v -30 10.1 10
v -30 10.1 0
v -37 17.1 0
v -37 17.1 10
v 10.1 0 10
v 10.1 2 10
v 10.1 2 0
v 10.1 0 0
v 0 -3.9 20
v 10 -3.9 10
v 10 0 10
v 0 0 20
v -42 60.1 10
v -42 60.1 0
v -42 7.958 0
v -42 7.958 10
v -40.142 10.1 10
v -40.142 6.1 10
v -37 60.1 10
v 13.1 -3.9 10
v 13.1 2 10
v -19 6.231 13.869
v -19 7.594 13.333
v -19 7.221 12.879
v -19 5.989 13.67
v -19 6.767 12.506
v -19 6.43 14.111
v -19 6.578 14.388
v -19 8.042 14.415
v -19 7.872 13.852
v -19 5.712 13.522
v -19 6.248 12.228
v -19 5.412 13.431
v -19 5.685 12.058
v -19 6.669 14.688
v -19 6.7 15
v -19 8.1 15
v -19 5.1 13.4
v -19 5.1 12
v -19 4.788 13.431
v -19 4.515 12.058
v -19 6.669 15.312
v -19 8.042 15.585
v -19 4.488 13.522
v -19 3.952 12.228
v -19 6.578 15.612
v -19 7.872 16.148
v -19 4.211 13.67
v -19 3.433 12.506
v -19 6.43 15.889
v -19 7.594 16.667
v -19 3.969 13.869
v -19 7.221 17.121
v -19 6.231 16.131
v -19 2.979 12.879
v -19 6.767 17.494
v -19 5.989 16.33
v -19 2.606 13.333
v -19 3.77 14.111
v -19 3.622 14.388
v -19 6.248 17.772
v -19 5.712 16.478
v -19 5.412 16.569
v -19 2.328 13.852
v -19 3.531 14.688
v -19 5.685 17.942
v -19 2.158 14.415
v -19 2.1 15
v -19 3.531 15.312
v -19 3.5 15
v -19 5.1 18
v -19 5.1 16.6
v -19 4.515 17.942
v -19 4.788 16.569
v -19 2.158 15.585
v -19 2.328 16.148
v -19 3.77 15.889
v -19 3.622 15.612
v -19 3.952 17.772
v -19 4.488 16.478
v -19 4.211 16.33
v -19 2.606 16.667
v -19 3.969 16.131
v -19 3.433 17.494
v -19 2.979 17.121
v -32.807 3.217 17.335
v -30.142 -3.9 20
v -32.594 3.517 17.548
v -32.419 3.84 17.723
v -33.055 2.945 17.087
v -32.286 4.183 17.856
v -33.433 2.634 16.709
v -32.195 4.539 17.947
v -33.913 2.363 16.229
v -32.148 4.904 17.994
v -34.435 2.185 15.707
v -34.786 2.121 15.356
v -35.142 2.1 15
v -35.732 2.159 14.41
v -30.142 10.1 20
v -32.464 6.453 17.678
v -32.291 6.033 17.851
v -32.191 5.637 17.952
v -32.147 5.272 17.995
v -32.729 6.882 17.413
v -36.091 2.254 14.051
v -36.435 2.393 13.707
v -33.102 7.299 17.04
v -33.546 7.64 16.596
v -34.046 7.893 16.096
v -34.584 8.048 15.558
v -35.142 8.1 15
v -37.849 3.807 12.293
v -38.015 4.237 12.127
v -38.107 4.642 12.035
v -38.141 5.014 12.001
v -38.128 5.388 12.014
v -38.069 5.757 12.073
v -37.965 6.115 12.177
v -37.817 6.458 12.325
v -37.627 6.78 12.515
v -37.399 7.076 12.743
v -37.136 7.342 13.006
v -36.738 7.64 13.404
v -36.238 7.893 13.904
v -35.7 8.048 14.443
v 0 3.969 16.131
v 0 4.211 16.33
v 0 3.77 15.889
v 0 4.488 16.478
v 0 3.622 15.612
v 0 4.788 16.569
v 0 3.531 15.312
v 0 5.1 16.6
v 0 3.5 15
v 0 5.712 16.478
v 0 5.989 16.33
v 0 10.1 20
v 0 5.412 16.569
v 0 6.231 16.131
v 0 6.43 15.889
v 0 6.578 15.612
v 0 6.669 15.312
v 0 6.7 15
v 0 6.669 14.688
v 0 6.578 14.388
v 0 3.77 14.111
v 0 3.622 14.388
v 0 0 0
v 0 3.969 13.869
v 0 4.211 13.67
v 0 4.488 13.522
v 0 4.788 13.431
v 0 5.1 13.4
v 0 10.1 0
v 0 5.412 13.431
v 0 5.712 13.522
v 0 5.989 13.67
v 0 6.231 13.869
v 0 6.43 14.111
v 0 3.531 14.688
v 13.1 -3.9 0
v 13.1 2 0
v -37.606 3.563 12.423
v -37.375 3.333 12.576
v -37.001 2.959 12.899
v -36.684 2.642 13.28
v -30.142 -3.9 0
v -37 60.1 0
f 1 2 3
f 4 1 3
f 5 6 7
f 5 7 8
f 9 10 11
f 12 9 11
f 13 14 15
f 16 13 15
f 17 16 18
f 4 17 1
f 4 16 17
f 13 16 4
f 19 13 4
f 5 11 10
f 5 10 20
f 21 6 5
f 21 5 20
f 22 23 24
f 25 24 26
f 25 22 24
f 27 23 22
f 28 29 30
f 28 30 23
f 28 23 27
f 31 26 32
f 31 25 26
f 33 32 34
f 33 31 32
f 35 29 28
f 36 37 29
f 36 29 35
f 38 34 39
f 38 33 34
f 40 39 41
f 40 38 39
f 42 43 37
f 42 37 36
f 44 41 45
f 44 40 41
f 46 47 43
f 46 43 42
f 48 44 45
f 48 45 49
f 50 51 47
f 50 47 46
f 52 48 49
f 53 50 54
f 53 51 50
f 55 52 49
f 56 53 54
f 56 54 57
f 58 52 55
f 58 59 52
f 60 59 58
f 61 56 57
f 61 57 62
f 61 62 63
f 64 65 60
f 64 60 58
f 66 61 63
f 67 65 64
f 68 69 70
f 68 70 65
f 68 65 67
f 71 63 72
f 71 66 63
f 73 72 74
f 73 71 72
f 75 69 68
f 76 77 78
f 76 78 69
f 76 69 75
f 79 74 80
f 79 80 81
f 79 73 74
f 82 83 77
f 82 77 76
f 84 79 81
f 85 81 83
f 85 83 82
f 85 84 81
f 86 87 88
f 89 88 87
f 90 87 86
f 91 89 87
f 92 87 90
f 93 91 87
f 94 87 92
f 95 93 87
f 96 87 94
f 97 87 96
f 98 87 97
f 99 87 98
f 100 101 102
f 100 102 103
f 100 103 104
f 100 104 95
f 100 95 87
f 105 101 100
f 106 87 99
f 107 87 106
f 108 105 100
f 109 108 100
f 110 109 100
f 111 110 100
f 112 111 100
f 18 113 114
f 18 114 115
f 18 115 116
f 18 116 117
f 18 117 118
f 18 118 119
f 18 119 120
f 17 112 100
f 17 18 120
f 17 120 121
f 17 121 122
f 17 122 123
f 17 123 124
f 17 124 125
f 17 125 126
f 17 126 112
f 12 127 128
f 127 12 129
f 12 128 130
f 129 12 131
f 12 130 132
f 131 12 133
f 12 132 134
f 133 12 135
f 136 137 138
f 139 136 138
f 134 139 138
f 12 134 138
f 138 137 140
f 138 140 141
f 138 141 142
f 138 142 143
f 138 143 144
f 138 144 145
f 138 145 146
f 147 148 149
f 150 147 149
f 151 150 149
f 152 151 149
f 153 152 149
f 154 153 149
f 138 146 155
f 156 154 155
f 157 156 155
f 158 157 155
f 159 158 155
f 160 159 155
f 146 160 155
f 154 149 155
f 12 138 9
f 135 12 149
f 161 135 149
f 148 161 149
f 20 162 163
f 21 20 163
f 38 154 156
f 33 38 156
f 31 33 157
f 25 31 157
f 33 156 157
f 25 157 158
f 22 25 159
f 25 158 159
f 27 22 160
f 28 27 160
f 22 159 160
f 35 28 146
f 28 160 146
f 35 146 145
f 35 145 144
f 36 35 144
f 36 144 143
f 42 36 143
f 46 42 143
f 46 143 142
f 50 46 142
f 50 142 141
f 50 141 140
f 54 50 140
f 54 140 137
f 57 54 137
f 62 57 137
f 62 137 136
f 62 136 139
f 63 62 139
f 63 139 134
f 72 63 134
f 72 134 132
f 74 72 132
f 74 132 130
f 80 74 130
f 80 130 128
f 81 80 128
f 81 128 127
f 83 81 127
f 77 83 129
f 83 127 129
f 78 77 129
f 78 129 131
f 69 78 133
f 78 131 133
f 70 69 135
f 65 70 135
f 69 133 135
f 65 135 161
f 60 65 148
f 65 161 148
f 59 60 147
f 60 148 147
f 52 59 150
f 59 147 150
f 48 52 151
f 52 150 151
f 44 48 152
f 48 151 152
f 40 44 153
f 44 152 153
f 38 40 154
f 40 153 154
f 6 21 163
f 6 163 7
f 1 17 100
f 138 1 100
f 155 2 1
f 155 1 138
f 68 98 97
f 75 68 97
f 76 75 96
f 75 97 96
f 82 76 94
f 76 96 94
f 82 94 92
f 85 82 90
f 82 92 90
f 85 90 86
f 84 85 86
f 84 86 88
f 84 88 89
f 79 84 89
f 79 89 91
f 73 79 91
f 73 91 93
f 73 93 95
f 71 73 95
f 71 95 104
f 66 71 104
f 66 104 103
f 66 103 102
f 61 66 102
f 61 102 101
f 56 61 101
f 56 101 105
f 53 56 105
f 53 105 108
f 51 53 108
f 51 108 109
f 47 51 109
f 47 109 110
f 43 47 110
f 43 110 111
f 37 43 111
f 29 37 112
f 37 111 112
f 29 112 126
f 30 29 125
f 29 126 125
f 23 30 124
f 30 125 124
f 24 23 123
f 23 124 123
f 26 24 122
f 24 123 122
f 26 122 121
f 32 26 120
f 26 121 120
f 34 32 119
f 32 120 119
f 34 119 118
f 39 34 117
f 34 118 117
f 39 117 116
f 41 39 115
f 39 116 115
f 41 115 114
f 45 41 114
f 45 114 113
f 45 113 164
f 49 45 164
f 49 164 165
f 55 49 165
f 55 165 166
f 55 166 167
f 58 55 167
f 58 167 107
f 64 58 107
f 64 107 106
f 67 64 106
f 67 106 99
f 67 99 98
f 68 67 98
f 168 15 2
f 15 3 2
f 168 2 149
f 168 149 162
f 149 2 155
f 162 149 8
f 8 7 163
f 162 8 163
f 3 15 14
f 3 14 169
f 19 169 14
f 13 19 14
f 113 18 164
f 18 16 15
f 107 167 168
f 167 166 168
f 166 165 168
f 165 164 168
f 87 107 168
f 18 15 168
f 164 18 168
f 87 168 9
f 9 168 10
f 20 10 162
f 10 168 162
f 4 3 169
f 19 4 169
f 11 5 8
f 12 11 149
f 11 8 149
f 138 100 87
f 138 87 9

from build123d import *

# Parameters (mm, degrees)
EXTRUDE_1_DEPTH     = 10
SKETCH_2_W          = 30.142135624
SKETCH_2_H          = 14
EXTRUDE_2_DEPTH     = 10
CHAMFER_2_SIZE      = 10
SKETCH_3_R          = 1.6
CUT_EXTRUDE_1_DEPTH = 77.000065789
SKETCH_4_R          = 3
CUT_EXTRUDE_2_DEPTH = 23


with BuildPart() as part:
    # ｽｹｯﾁ1 → ﾎﾞｽ - 押し出し1 (new body)
    with BuildSketch(Plane.XY):
        Polygon((0, 0), (0, 10.1), (-30, 10.1), (-37, 17.1), (-37, 60.1), (-42, 60.1), (-42, 7.957864376), (-30.142135624, -3.9), (13.1, -3.9), (13.1, 2), (10.1, 2), (10.1, 0), align=None)
    extrude(amount=EXTRUDE_1_DEPTH)

    # ｽｹｯﾁ2 → ﾎﾞｽ - 押し出し2 (add)
    with BuildSketch(Plane.XY.offset(10)):
        with Locations((-15.071067812, 3.1)):
            Rectangle(SKETCH_2_W, SKETCH_2_H)
    extrude(amount=EXTRUDE_2_DEPTH)

    # 面取り2
    chamfer_2_edges = [part.edges().sort_by_distance(p)[0] for p in [
        (-30.142135624, 3.1, 10),
        (0, -1.95, 10),
    ]]
    chamfer(chamfer_2_edges, length=CHAMFER_2_SIZE - 0.0001)  # a hair under: the kernel refuses the full size

    # ｽｹｯﾁ3 → ｶｯﾄ - 押し出し1 (cut, through all)
    with BuildSketch(Plane(origin=(0, 0, 0), x_dir=(0, 0, -1), z_dir=(1, 0, 0))):
        with Locations((-15, 5.1)):
            Circle(SKETCH_3_R)
    extrude(amount=-CUT_EXTRUDE_1_DEPTH, mode=Mode.SUBTRACT)

    # ｽｹｯﾁ4 → ｶｯﾄ - 押し出し2 (cut)
    with BuildSketch(Plane.ZY.offset(42)):
        with Locations(Location((15, 5.1, 0), (0, 0, 270))):
            Circle(SKETCH_4_R)
    extrude(amount=-CUT_EXTRUDE_2_DEPTH, mode=Mode.SUBTRACT)


solid = part.part
